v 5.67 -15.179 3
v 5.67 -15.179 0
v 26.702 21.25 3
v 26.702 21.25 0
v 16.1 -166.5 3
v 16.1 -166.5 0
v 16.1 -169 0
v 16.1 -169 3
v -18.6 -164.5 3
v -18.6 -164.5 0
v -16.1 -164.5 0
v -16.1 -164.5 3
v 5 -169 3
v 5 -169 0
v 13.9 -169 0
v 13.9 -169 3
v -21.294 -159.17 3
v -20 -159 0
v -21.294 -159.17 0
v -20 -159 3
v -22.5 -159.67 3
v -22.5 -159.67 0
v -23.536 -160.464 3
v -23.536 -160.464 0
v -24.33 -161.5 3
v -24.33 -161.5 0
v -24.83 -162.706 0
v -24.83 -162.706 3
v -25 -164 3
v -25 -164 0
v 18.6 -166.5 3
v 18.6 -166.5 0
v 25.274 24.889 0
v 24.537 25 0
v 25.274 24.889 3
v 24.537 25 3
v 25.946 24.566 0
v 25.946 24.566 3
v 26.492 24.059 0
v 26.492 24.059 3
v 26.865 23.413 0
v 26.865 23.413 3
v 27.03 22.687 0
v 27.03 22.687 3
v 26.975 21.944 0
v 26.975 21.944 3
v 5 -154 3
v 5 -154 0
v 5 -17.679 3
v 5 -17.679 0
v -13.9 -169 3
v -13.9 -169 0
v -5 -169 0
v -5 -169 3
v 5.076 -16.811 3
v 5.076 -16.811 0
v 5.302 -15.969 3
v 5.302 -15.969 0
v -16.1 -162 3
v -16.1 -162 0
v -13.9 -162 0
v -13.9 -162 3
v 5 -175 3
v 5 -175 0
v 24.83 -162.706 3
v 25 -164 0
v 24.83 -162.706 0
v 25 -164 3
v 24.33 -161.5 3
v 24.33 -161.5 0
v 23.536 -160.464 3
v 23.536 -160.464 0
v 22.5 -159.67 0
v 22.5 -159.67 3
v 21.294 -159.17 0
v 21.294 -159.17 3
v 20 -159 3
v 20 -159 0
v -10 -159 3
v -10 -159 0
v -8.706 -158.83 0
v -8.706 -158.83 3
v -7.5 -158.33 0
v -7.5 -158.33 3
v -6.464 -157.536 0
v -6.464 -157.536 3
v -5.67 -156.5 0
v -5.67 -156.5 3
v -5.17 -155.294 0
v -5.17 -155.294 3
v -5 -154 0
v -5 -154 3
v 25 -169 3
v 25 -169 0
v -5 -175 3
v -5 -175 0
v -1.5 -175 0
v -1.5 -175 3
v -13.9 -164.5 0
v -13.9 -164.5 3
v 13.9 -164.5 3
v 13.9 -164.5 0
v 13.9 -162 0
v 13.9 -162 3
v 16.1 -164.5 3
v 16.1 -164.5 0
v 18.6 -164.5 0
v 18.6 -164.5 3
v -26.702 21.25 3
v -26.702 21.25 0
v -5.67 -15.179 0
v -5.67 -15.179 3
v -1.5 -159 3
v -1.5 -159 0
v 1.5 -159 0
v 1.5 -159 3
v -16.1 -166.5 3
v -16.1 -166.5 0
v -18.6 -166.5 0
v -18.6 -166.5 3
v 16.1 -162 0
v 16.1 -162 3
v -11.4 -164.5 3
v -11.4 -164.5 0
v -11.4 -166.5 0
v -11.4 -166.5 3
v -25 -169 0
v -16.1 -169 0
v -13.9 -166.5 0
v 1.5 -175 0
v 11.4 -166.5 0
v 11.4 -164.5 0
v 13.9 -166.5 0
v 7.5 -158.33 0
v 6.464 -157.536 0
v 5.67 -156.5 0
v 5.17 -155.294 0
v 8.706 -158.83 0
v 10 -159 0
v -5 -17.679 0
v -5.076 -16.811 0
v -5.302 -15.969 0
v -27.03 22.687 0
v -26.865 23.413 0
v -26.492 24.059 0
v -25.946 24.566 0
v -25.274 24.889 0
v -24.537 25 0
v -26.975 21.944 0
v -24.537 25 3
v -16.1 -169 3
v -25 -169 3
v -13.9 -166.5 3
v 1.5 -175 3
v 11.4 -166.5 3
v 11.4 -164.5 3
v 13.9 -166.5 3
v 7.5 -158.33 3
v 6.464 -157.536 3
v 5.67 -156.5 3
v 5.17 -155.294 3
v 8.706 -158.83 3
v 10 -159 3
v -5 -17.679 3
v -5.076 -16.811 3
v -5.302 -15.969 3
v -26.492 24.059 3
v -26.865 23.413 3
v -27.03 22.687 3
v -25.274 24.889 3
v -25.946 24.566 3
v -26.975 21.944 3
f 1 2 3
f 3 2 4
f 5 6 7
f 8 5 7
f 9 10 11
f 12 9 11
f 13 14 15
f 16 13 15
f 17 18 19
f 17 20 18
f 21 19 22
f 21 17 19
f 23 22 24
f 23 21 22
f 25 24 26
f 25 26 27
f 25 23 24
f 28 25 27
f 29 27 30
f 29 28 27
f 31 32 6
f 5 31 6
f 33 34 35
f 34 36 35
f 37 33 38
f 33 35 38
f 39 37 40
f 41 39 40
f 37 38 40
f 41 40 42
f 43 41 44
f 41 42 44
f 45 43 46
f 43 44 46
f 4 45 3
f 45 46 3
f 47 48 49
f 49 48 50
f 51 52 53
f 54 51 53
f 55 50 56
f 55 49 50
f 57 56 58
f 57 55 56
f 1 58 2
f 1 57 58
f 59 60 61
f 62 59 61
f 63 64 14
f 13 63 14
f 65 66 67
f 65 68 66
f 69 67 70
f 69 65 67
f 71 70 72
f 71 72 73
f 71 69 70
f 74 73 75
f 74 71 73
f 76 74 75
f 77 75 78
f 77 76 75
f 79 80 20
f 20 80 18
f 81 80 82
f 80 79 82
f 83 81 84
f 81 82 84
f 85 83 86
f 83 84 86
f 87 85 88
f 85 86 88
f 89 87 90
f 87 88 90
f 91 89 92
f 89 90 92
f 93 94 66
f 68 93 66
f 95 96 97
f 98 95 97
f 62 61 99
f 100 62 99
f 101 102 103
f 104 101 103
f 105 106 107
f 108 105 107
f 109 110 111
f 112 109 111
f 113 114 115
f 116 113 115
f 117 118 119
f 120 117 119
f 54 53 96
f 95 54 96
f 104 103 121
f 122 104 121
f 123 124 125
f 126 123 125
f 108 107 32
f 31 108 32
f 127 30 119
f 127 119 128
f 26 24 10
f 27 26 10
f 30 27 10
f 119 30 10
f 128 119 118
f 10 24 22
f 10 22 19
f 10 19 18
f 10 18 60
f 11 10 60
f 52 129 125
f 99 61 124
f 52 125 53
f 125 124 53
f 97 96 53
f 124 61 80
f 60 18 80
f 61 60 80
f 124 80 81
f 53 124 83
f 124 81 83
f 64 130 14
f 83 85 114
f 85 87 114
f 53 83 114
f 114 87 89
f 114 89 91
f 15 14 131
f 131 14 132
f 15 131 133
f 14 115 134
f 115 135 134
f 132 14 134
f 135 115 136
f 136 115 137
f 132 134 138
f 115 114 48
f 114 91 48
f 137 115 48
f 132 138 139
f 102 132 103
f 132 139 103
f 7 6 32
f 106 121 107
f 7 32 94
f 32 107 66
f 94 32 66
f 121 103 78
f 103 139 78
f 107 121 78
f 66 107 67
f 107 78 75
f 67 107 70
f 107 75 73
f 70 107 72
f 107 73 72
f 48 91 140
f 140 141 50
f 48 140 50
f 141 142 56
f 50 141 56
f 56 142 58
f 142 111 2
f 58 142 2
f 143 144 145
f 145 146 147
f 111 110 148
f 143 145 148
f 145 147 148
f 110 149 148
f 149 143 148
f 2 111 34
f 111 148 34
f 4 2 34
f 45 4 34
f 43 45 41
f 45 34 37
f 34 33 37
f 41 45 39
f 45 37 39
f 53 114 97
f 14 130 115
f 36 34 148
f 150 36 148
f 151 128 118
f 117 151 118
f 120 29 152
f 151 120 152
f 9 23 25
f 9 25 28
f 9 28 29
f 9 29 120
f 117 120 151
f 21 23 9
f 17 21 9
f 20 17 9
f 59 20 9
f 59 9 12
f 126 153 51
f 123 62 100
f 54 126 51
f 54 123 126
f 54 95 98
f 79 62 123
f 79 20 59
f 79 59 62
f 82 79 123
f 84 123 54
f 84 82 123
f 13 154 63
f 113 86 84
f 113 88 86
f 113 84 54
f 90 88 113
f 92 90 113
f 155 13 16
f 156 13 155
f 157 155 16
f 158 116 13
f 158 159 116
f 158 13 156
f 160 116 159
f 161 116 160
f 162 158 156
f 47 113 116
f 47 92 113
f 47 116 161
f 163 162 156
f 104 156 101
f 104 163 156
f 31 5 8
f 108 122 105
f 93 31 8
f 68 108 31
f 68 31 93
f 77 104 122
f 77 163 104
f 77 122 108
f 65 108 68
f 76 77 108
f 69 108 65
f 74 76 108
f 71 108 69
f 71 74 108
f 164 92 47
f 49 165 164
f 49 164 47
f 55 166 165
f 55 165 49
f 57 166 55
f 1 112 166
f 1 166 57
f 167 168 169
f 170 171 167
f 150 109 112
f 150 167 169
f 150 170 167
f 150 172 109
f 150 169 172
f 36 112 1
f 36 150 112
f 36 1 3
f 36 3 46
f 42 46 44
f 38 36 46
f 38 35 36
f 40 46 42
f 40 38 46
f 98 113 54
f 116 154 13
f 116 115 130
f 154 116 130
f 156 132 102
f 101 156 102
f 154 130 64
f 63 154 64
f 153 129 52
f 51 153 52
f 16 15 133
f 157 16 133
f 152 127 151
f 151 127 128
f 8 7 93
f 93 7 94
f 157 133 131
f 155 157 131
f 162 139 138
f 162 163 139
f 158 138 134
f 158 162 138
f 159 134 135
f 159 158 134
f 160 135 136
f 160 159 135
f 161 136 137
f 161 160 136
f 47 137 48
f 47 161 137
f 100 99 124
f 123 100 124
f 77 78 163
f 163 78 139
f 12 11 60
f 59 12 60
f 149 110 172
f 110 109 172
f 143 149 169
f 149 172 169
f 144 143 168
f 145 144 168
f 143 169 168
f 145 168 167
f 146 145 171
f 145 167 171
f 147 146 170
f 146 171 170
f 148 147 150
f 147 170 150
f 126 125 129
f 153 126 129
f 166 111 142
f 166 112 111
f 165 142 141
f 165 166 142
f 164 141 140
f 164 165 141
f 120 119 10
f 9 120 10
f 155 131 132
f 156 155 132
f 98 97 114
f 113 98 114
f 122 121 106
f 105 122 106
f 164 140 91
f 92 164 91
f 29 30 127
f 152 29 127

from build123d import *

# Parameters (mm, degrees)
BOSS_EXTRUDE1_DEPTH = 3
FILLET1_R           = 5
FILLET2_R           = 2.5


with BuildPart() as part:
    # Sketch1 → Boss-Extrude1 (new body)
    with BuildSketch(Plane.XY):
        Polygon((-5, -25), (-5, -159), (-25, -159), (-25, -169), (-16.1, -169), (-16.1, -166.5), (-18.6, -166.5), (-18.6, -164.5), (-16.1, -164.5), (-16.1, -162), (-13.9, -162), (-13.9, -164.5), (-11.4, -164.5), (-11.4, -166.5), (-13.9, -166.5), (-13.9, -169), (-5, -169), (-5, -175), (-1.5, -175), (-1.5, -159), (1.5, -159), (1.5, -175), (5, -175), (5, -169), (13.9, -169), (13.9, -166.5), (11.4, -166.5), (11.4, -164.5), (13.9, -164.5), (13.9, -162), (16.1, -162), (16.1, -164.5), (18.6, -164.5), (18.6, -166.5), (16.1, -166.5), (16.1, -169), (25, -169), (25, -159), (5, -159), (5, -25), (5, -16.339741924), (28.8675, 25), (0, 25), (-28.8675, 25), (-5, -16.339741924), align=None)
    extrude(amount=BOSS_EXTRUDE1_DEPTH)

    # Fillet1
    fillet1_edges = [part.edges().sort_by_distance(p)[0] for p in [
        (-5, -16.339741924, 1.5),
        (5, -16.339741924, 1.5),
        (5, -159, 1.5),
        (25, -159, 1.5),
        (-25, -159, 1.5),
        (-5, -159, 1.5),
    ]]
    fillet(fillet1_edges, radius=FILLET1_R)

    # Fillet2
    fillet2_edges = [part.edges().sort_by_distance(p)[0] for p in [
        (-28.8675, 25, 1.5),
        (28.8675, 25, 1.5),
    ]]
    fillet(fillet2_edges, radius=FILLET2_R)


solid = part.part
